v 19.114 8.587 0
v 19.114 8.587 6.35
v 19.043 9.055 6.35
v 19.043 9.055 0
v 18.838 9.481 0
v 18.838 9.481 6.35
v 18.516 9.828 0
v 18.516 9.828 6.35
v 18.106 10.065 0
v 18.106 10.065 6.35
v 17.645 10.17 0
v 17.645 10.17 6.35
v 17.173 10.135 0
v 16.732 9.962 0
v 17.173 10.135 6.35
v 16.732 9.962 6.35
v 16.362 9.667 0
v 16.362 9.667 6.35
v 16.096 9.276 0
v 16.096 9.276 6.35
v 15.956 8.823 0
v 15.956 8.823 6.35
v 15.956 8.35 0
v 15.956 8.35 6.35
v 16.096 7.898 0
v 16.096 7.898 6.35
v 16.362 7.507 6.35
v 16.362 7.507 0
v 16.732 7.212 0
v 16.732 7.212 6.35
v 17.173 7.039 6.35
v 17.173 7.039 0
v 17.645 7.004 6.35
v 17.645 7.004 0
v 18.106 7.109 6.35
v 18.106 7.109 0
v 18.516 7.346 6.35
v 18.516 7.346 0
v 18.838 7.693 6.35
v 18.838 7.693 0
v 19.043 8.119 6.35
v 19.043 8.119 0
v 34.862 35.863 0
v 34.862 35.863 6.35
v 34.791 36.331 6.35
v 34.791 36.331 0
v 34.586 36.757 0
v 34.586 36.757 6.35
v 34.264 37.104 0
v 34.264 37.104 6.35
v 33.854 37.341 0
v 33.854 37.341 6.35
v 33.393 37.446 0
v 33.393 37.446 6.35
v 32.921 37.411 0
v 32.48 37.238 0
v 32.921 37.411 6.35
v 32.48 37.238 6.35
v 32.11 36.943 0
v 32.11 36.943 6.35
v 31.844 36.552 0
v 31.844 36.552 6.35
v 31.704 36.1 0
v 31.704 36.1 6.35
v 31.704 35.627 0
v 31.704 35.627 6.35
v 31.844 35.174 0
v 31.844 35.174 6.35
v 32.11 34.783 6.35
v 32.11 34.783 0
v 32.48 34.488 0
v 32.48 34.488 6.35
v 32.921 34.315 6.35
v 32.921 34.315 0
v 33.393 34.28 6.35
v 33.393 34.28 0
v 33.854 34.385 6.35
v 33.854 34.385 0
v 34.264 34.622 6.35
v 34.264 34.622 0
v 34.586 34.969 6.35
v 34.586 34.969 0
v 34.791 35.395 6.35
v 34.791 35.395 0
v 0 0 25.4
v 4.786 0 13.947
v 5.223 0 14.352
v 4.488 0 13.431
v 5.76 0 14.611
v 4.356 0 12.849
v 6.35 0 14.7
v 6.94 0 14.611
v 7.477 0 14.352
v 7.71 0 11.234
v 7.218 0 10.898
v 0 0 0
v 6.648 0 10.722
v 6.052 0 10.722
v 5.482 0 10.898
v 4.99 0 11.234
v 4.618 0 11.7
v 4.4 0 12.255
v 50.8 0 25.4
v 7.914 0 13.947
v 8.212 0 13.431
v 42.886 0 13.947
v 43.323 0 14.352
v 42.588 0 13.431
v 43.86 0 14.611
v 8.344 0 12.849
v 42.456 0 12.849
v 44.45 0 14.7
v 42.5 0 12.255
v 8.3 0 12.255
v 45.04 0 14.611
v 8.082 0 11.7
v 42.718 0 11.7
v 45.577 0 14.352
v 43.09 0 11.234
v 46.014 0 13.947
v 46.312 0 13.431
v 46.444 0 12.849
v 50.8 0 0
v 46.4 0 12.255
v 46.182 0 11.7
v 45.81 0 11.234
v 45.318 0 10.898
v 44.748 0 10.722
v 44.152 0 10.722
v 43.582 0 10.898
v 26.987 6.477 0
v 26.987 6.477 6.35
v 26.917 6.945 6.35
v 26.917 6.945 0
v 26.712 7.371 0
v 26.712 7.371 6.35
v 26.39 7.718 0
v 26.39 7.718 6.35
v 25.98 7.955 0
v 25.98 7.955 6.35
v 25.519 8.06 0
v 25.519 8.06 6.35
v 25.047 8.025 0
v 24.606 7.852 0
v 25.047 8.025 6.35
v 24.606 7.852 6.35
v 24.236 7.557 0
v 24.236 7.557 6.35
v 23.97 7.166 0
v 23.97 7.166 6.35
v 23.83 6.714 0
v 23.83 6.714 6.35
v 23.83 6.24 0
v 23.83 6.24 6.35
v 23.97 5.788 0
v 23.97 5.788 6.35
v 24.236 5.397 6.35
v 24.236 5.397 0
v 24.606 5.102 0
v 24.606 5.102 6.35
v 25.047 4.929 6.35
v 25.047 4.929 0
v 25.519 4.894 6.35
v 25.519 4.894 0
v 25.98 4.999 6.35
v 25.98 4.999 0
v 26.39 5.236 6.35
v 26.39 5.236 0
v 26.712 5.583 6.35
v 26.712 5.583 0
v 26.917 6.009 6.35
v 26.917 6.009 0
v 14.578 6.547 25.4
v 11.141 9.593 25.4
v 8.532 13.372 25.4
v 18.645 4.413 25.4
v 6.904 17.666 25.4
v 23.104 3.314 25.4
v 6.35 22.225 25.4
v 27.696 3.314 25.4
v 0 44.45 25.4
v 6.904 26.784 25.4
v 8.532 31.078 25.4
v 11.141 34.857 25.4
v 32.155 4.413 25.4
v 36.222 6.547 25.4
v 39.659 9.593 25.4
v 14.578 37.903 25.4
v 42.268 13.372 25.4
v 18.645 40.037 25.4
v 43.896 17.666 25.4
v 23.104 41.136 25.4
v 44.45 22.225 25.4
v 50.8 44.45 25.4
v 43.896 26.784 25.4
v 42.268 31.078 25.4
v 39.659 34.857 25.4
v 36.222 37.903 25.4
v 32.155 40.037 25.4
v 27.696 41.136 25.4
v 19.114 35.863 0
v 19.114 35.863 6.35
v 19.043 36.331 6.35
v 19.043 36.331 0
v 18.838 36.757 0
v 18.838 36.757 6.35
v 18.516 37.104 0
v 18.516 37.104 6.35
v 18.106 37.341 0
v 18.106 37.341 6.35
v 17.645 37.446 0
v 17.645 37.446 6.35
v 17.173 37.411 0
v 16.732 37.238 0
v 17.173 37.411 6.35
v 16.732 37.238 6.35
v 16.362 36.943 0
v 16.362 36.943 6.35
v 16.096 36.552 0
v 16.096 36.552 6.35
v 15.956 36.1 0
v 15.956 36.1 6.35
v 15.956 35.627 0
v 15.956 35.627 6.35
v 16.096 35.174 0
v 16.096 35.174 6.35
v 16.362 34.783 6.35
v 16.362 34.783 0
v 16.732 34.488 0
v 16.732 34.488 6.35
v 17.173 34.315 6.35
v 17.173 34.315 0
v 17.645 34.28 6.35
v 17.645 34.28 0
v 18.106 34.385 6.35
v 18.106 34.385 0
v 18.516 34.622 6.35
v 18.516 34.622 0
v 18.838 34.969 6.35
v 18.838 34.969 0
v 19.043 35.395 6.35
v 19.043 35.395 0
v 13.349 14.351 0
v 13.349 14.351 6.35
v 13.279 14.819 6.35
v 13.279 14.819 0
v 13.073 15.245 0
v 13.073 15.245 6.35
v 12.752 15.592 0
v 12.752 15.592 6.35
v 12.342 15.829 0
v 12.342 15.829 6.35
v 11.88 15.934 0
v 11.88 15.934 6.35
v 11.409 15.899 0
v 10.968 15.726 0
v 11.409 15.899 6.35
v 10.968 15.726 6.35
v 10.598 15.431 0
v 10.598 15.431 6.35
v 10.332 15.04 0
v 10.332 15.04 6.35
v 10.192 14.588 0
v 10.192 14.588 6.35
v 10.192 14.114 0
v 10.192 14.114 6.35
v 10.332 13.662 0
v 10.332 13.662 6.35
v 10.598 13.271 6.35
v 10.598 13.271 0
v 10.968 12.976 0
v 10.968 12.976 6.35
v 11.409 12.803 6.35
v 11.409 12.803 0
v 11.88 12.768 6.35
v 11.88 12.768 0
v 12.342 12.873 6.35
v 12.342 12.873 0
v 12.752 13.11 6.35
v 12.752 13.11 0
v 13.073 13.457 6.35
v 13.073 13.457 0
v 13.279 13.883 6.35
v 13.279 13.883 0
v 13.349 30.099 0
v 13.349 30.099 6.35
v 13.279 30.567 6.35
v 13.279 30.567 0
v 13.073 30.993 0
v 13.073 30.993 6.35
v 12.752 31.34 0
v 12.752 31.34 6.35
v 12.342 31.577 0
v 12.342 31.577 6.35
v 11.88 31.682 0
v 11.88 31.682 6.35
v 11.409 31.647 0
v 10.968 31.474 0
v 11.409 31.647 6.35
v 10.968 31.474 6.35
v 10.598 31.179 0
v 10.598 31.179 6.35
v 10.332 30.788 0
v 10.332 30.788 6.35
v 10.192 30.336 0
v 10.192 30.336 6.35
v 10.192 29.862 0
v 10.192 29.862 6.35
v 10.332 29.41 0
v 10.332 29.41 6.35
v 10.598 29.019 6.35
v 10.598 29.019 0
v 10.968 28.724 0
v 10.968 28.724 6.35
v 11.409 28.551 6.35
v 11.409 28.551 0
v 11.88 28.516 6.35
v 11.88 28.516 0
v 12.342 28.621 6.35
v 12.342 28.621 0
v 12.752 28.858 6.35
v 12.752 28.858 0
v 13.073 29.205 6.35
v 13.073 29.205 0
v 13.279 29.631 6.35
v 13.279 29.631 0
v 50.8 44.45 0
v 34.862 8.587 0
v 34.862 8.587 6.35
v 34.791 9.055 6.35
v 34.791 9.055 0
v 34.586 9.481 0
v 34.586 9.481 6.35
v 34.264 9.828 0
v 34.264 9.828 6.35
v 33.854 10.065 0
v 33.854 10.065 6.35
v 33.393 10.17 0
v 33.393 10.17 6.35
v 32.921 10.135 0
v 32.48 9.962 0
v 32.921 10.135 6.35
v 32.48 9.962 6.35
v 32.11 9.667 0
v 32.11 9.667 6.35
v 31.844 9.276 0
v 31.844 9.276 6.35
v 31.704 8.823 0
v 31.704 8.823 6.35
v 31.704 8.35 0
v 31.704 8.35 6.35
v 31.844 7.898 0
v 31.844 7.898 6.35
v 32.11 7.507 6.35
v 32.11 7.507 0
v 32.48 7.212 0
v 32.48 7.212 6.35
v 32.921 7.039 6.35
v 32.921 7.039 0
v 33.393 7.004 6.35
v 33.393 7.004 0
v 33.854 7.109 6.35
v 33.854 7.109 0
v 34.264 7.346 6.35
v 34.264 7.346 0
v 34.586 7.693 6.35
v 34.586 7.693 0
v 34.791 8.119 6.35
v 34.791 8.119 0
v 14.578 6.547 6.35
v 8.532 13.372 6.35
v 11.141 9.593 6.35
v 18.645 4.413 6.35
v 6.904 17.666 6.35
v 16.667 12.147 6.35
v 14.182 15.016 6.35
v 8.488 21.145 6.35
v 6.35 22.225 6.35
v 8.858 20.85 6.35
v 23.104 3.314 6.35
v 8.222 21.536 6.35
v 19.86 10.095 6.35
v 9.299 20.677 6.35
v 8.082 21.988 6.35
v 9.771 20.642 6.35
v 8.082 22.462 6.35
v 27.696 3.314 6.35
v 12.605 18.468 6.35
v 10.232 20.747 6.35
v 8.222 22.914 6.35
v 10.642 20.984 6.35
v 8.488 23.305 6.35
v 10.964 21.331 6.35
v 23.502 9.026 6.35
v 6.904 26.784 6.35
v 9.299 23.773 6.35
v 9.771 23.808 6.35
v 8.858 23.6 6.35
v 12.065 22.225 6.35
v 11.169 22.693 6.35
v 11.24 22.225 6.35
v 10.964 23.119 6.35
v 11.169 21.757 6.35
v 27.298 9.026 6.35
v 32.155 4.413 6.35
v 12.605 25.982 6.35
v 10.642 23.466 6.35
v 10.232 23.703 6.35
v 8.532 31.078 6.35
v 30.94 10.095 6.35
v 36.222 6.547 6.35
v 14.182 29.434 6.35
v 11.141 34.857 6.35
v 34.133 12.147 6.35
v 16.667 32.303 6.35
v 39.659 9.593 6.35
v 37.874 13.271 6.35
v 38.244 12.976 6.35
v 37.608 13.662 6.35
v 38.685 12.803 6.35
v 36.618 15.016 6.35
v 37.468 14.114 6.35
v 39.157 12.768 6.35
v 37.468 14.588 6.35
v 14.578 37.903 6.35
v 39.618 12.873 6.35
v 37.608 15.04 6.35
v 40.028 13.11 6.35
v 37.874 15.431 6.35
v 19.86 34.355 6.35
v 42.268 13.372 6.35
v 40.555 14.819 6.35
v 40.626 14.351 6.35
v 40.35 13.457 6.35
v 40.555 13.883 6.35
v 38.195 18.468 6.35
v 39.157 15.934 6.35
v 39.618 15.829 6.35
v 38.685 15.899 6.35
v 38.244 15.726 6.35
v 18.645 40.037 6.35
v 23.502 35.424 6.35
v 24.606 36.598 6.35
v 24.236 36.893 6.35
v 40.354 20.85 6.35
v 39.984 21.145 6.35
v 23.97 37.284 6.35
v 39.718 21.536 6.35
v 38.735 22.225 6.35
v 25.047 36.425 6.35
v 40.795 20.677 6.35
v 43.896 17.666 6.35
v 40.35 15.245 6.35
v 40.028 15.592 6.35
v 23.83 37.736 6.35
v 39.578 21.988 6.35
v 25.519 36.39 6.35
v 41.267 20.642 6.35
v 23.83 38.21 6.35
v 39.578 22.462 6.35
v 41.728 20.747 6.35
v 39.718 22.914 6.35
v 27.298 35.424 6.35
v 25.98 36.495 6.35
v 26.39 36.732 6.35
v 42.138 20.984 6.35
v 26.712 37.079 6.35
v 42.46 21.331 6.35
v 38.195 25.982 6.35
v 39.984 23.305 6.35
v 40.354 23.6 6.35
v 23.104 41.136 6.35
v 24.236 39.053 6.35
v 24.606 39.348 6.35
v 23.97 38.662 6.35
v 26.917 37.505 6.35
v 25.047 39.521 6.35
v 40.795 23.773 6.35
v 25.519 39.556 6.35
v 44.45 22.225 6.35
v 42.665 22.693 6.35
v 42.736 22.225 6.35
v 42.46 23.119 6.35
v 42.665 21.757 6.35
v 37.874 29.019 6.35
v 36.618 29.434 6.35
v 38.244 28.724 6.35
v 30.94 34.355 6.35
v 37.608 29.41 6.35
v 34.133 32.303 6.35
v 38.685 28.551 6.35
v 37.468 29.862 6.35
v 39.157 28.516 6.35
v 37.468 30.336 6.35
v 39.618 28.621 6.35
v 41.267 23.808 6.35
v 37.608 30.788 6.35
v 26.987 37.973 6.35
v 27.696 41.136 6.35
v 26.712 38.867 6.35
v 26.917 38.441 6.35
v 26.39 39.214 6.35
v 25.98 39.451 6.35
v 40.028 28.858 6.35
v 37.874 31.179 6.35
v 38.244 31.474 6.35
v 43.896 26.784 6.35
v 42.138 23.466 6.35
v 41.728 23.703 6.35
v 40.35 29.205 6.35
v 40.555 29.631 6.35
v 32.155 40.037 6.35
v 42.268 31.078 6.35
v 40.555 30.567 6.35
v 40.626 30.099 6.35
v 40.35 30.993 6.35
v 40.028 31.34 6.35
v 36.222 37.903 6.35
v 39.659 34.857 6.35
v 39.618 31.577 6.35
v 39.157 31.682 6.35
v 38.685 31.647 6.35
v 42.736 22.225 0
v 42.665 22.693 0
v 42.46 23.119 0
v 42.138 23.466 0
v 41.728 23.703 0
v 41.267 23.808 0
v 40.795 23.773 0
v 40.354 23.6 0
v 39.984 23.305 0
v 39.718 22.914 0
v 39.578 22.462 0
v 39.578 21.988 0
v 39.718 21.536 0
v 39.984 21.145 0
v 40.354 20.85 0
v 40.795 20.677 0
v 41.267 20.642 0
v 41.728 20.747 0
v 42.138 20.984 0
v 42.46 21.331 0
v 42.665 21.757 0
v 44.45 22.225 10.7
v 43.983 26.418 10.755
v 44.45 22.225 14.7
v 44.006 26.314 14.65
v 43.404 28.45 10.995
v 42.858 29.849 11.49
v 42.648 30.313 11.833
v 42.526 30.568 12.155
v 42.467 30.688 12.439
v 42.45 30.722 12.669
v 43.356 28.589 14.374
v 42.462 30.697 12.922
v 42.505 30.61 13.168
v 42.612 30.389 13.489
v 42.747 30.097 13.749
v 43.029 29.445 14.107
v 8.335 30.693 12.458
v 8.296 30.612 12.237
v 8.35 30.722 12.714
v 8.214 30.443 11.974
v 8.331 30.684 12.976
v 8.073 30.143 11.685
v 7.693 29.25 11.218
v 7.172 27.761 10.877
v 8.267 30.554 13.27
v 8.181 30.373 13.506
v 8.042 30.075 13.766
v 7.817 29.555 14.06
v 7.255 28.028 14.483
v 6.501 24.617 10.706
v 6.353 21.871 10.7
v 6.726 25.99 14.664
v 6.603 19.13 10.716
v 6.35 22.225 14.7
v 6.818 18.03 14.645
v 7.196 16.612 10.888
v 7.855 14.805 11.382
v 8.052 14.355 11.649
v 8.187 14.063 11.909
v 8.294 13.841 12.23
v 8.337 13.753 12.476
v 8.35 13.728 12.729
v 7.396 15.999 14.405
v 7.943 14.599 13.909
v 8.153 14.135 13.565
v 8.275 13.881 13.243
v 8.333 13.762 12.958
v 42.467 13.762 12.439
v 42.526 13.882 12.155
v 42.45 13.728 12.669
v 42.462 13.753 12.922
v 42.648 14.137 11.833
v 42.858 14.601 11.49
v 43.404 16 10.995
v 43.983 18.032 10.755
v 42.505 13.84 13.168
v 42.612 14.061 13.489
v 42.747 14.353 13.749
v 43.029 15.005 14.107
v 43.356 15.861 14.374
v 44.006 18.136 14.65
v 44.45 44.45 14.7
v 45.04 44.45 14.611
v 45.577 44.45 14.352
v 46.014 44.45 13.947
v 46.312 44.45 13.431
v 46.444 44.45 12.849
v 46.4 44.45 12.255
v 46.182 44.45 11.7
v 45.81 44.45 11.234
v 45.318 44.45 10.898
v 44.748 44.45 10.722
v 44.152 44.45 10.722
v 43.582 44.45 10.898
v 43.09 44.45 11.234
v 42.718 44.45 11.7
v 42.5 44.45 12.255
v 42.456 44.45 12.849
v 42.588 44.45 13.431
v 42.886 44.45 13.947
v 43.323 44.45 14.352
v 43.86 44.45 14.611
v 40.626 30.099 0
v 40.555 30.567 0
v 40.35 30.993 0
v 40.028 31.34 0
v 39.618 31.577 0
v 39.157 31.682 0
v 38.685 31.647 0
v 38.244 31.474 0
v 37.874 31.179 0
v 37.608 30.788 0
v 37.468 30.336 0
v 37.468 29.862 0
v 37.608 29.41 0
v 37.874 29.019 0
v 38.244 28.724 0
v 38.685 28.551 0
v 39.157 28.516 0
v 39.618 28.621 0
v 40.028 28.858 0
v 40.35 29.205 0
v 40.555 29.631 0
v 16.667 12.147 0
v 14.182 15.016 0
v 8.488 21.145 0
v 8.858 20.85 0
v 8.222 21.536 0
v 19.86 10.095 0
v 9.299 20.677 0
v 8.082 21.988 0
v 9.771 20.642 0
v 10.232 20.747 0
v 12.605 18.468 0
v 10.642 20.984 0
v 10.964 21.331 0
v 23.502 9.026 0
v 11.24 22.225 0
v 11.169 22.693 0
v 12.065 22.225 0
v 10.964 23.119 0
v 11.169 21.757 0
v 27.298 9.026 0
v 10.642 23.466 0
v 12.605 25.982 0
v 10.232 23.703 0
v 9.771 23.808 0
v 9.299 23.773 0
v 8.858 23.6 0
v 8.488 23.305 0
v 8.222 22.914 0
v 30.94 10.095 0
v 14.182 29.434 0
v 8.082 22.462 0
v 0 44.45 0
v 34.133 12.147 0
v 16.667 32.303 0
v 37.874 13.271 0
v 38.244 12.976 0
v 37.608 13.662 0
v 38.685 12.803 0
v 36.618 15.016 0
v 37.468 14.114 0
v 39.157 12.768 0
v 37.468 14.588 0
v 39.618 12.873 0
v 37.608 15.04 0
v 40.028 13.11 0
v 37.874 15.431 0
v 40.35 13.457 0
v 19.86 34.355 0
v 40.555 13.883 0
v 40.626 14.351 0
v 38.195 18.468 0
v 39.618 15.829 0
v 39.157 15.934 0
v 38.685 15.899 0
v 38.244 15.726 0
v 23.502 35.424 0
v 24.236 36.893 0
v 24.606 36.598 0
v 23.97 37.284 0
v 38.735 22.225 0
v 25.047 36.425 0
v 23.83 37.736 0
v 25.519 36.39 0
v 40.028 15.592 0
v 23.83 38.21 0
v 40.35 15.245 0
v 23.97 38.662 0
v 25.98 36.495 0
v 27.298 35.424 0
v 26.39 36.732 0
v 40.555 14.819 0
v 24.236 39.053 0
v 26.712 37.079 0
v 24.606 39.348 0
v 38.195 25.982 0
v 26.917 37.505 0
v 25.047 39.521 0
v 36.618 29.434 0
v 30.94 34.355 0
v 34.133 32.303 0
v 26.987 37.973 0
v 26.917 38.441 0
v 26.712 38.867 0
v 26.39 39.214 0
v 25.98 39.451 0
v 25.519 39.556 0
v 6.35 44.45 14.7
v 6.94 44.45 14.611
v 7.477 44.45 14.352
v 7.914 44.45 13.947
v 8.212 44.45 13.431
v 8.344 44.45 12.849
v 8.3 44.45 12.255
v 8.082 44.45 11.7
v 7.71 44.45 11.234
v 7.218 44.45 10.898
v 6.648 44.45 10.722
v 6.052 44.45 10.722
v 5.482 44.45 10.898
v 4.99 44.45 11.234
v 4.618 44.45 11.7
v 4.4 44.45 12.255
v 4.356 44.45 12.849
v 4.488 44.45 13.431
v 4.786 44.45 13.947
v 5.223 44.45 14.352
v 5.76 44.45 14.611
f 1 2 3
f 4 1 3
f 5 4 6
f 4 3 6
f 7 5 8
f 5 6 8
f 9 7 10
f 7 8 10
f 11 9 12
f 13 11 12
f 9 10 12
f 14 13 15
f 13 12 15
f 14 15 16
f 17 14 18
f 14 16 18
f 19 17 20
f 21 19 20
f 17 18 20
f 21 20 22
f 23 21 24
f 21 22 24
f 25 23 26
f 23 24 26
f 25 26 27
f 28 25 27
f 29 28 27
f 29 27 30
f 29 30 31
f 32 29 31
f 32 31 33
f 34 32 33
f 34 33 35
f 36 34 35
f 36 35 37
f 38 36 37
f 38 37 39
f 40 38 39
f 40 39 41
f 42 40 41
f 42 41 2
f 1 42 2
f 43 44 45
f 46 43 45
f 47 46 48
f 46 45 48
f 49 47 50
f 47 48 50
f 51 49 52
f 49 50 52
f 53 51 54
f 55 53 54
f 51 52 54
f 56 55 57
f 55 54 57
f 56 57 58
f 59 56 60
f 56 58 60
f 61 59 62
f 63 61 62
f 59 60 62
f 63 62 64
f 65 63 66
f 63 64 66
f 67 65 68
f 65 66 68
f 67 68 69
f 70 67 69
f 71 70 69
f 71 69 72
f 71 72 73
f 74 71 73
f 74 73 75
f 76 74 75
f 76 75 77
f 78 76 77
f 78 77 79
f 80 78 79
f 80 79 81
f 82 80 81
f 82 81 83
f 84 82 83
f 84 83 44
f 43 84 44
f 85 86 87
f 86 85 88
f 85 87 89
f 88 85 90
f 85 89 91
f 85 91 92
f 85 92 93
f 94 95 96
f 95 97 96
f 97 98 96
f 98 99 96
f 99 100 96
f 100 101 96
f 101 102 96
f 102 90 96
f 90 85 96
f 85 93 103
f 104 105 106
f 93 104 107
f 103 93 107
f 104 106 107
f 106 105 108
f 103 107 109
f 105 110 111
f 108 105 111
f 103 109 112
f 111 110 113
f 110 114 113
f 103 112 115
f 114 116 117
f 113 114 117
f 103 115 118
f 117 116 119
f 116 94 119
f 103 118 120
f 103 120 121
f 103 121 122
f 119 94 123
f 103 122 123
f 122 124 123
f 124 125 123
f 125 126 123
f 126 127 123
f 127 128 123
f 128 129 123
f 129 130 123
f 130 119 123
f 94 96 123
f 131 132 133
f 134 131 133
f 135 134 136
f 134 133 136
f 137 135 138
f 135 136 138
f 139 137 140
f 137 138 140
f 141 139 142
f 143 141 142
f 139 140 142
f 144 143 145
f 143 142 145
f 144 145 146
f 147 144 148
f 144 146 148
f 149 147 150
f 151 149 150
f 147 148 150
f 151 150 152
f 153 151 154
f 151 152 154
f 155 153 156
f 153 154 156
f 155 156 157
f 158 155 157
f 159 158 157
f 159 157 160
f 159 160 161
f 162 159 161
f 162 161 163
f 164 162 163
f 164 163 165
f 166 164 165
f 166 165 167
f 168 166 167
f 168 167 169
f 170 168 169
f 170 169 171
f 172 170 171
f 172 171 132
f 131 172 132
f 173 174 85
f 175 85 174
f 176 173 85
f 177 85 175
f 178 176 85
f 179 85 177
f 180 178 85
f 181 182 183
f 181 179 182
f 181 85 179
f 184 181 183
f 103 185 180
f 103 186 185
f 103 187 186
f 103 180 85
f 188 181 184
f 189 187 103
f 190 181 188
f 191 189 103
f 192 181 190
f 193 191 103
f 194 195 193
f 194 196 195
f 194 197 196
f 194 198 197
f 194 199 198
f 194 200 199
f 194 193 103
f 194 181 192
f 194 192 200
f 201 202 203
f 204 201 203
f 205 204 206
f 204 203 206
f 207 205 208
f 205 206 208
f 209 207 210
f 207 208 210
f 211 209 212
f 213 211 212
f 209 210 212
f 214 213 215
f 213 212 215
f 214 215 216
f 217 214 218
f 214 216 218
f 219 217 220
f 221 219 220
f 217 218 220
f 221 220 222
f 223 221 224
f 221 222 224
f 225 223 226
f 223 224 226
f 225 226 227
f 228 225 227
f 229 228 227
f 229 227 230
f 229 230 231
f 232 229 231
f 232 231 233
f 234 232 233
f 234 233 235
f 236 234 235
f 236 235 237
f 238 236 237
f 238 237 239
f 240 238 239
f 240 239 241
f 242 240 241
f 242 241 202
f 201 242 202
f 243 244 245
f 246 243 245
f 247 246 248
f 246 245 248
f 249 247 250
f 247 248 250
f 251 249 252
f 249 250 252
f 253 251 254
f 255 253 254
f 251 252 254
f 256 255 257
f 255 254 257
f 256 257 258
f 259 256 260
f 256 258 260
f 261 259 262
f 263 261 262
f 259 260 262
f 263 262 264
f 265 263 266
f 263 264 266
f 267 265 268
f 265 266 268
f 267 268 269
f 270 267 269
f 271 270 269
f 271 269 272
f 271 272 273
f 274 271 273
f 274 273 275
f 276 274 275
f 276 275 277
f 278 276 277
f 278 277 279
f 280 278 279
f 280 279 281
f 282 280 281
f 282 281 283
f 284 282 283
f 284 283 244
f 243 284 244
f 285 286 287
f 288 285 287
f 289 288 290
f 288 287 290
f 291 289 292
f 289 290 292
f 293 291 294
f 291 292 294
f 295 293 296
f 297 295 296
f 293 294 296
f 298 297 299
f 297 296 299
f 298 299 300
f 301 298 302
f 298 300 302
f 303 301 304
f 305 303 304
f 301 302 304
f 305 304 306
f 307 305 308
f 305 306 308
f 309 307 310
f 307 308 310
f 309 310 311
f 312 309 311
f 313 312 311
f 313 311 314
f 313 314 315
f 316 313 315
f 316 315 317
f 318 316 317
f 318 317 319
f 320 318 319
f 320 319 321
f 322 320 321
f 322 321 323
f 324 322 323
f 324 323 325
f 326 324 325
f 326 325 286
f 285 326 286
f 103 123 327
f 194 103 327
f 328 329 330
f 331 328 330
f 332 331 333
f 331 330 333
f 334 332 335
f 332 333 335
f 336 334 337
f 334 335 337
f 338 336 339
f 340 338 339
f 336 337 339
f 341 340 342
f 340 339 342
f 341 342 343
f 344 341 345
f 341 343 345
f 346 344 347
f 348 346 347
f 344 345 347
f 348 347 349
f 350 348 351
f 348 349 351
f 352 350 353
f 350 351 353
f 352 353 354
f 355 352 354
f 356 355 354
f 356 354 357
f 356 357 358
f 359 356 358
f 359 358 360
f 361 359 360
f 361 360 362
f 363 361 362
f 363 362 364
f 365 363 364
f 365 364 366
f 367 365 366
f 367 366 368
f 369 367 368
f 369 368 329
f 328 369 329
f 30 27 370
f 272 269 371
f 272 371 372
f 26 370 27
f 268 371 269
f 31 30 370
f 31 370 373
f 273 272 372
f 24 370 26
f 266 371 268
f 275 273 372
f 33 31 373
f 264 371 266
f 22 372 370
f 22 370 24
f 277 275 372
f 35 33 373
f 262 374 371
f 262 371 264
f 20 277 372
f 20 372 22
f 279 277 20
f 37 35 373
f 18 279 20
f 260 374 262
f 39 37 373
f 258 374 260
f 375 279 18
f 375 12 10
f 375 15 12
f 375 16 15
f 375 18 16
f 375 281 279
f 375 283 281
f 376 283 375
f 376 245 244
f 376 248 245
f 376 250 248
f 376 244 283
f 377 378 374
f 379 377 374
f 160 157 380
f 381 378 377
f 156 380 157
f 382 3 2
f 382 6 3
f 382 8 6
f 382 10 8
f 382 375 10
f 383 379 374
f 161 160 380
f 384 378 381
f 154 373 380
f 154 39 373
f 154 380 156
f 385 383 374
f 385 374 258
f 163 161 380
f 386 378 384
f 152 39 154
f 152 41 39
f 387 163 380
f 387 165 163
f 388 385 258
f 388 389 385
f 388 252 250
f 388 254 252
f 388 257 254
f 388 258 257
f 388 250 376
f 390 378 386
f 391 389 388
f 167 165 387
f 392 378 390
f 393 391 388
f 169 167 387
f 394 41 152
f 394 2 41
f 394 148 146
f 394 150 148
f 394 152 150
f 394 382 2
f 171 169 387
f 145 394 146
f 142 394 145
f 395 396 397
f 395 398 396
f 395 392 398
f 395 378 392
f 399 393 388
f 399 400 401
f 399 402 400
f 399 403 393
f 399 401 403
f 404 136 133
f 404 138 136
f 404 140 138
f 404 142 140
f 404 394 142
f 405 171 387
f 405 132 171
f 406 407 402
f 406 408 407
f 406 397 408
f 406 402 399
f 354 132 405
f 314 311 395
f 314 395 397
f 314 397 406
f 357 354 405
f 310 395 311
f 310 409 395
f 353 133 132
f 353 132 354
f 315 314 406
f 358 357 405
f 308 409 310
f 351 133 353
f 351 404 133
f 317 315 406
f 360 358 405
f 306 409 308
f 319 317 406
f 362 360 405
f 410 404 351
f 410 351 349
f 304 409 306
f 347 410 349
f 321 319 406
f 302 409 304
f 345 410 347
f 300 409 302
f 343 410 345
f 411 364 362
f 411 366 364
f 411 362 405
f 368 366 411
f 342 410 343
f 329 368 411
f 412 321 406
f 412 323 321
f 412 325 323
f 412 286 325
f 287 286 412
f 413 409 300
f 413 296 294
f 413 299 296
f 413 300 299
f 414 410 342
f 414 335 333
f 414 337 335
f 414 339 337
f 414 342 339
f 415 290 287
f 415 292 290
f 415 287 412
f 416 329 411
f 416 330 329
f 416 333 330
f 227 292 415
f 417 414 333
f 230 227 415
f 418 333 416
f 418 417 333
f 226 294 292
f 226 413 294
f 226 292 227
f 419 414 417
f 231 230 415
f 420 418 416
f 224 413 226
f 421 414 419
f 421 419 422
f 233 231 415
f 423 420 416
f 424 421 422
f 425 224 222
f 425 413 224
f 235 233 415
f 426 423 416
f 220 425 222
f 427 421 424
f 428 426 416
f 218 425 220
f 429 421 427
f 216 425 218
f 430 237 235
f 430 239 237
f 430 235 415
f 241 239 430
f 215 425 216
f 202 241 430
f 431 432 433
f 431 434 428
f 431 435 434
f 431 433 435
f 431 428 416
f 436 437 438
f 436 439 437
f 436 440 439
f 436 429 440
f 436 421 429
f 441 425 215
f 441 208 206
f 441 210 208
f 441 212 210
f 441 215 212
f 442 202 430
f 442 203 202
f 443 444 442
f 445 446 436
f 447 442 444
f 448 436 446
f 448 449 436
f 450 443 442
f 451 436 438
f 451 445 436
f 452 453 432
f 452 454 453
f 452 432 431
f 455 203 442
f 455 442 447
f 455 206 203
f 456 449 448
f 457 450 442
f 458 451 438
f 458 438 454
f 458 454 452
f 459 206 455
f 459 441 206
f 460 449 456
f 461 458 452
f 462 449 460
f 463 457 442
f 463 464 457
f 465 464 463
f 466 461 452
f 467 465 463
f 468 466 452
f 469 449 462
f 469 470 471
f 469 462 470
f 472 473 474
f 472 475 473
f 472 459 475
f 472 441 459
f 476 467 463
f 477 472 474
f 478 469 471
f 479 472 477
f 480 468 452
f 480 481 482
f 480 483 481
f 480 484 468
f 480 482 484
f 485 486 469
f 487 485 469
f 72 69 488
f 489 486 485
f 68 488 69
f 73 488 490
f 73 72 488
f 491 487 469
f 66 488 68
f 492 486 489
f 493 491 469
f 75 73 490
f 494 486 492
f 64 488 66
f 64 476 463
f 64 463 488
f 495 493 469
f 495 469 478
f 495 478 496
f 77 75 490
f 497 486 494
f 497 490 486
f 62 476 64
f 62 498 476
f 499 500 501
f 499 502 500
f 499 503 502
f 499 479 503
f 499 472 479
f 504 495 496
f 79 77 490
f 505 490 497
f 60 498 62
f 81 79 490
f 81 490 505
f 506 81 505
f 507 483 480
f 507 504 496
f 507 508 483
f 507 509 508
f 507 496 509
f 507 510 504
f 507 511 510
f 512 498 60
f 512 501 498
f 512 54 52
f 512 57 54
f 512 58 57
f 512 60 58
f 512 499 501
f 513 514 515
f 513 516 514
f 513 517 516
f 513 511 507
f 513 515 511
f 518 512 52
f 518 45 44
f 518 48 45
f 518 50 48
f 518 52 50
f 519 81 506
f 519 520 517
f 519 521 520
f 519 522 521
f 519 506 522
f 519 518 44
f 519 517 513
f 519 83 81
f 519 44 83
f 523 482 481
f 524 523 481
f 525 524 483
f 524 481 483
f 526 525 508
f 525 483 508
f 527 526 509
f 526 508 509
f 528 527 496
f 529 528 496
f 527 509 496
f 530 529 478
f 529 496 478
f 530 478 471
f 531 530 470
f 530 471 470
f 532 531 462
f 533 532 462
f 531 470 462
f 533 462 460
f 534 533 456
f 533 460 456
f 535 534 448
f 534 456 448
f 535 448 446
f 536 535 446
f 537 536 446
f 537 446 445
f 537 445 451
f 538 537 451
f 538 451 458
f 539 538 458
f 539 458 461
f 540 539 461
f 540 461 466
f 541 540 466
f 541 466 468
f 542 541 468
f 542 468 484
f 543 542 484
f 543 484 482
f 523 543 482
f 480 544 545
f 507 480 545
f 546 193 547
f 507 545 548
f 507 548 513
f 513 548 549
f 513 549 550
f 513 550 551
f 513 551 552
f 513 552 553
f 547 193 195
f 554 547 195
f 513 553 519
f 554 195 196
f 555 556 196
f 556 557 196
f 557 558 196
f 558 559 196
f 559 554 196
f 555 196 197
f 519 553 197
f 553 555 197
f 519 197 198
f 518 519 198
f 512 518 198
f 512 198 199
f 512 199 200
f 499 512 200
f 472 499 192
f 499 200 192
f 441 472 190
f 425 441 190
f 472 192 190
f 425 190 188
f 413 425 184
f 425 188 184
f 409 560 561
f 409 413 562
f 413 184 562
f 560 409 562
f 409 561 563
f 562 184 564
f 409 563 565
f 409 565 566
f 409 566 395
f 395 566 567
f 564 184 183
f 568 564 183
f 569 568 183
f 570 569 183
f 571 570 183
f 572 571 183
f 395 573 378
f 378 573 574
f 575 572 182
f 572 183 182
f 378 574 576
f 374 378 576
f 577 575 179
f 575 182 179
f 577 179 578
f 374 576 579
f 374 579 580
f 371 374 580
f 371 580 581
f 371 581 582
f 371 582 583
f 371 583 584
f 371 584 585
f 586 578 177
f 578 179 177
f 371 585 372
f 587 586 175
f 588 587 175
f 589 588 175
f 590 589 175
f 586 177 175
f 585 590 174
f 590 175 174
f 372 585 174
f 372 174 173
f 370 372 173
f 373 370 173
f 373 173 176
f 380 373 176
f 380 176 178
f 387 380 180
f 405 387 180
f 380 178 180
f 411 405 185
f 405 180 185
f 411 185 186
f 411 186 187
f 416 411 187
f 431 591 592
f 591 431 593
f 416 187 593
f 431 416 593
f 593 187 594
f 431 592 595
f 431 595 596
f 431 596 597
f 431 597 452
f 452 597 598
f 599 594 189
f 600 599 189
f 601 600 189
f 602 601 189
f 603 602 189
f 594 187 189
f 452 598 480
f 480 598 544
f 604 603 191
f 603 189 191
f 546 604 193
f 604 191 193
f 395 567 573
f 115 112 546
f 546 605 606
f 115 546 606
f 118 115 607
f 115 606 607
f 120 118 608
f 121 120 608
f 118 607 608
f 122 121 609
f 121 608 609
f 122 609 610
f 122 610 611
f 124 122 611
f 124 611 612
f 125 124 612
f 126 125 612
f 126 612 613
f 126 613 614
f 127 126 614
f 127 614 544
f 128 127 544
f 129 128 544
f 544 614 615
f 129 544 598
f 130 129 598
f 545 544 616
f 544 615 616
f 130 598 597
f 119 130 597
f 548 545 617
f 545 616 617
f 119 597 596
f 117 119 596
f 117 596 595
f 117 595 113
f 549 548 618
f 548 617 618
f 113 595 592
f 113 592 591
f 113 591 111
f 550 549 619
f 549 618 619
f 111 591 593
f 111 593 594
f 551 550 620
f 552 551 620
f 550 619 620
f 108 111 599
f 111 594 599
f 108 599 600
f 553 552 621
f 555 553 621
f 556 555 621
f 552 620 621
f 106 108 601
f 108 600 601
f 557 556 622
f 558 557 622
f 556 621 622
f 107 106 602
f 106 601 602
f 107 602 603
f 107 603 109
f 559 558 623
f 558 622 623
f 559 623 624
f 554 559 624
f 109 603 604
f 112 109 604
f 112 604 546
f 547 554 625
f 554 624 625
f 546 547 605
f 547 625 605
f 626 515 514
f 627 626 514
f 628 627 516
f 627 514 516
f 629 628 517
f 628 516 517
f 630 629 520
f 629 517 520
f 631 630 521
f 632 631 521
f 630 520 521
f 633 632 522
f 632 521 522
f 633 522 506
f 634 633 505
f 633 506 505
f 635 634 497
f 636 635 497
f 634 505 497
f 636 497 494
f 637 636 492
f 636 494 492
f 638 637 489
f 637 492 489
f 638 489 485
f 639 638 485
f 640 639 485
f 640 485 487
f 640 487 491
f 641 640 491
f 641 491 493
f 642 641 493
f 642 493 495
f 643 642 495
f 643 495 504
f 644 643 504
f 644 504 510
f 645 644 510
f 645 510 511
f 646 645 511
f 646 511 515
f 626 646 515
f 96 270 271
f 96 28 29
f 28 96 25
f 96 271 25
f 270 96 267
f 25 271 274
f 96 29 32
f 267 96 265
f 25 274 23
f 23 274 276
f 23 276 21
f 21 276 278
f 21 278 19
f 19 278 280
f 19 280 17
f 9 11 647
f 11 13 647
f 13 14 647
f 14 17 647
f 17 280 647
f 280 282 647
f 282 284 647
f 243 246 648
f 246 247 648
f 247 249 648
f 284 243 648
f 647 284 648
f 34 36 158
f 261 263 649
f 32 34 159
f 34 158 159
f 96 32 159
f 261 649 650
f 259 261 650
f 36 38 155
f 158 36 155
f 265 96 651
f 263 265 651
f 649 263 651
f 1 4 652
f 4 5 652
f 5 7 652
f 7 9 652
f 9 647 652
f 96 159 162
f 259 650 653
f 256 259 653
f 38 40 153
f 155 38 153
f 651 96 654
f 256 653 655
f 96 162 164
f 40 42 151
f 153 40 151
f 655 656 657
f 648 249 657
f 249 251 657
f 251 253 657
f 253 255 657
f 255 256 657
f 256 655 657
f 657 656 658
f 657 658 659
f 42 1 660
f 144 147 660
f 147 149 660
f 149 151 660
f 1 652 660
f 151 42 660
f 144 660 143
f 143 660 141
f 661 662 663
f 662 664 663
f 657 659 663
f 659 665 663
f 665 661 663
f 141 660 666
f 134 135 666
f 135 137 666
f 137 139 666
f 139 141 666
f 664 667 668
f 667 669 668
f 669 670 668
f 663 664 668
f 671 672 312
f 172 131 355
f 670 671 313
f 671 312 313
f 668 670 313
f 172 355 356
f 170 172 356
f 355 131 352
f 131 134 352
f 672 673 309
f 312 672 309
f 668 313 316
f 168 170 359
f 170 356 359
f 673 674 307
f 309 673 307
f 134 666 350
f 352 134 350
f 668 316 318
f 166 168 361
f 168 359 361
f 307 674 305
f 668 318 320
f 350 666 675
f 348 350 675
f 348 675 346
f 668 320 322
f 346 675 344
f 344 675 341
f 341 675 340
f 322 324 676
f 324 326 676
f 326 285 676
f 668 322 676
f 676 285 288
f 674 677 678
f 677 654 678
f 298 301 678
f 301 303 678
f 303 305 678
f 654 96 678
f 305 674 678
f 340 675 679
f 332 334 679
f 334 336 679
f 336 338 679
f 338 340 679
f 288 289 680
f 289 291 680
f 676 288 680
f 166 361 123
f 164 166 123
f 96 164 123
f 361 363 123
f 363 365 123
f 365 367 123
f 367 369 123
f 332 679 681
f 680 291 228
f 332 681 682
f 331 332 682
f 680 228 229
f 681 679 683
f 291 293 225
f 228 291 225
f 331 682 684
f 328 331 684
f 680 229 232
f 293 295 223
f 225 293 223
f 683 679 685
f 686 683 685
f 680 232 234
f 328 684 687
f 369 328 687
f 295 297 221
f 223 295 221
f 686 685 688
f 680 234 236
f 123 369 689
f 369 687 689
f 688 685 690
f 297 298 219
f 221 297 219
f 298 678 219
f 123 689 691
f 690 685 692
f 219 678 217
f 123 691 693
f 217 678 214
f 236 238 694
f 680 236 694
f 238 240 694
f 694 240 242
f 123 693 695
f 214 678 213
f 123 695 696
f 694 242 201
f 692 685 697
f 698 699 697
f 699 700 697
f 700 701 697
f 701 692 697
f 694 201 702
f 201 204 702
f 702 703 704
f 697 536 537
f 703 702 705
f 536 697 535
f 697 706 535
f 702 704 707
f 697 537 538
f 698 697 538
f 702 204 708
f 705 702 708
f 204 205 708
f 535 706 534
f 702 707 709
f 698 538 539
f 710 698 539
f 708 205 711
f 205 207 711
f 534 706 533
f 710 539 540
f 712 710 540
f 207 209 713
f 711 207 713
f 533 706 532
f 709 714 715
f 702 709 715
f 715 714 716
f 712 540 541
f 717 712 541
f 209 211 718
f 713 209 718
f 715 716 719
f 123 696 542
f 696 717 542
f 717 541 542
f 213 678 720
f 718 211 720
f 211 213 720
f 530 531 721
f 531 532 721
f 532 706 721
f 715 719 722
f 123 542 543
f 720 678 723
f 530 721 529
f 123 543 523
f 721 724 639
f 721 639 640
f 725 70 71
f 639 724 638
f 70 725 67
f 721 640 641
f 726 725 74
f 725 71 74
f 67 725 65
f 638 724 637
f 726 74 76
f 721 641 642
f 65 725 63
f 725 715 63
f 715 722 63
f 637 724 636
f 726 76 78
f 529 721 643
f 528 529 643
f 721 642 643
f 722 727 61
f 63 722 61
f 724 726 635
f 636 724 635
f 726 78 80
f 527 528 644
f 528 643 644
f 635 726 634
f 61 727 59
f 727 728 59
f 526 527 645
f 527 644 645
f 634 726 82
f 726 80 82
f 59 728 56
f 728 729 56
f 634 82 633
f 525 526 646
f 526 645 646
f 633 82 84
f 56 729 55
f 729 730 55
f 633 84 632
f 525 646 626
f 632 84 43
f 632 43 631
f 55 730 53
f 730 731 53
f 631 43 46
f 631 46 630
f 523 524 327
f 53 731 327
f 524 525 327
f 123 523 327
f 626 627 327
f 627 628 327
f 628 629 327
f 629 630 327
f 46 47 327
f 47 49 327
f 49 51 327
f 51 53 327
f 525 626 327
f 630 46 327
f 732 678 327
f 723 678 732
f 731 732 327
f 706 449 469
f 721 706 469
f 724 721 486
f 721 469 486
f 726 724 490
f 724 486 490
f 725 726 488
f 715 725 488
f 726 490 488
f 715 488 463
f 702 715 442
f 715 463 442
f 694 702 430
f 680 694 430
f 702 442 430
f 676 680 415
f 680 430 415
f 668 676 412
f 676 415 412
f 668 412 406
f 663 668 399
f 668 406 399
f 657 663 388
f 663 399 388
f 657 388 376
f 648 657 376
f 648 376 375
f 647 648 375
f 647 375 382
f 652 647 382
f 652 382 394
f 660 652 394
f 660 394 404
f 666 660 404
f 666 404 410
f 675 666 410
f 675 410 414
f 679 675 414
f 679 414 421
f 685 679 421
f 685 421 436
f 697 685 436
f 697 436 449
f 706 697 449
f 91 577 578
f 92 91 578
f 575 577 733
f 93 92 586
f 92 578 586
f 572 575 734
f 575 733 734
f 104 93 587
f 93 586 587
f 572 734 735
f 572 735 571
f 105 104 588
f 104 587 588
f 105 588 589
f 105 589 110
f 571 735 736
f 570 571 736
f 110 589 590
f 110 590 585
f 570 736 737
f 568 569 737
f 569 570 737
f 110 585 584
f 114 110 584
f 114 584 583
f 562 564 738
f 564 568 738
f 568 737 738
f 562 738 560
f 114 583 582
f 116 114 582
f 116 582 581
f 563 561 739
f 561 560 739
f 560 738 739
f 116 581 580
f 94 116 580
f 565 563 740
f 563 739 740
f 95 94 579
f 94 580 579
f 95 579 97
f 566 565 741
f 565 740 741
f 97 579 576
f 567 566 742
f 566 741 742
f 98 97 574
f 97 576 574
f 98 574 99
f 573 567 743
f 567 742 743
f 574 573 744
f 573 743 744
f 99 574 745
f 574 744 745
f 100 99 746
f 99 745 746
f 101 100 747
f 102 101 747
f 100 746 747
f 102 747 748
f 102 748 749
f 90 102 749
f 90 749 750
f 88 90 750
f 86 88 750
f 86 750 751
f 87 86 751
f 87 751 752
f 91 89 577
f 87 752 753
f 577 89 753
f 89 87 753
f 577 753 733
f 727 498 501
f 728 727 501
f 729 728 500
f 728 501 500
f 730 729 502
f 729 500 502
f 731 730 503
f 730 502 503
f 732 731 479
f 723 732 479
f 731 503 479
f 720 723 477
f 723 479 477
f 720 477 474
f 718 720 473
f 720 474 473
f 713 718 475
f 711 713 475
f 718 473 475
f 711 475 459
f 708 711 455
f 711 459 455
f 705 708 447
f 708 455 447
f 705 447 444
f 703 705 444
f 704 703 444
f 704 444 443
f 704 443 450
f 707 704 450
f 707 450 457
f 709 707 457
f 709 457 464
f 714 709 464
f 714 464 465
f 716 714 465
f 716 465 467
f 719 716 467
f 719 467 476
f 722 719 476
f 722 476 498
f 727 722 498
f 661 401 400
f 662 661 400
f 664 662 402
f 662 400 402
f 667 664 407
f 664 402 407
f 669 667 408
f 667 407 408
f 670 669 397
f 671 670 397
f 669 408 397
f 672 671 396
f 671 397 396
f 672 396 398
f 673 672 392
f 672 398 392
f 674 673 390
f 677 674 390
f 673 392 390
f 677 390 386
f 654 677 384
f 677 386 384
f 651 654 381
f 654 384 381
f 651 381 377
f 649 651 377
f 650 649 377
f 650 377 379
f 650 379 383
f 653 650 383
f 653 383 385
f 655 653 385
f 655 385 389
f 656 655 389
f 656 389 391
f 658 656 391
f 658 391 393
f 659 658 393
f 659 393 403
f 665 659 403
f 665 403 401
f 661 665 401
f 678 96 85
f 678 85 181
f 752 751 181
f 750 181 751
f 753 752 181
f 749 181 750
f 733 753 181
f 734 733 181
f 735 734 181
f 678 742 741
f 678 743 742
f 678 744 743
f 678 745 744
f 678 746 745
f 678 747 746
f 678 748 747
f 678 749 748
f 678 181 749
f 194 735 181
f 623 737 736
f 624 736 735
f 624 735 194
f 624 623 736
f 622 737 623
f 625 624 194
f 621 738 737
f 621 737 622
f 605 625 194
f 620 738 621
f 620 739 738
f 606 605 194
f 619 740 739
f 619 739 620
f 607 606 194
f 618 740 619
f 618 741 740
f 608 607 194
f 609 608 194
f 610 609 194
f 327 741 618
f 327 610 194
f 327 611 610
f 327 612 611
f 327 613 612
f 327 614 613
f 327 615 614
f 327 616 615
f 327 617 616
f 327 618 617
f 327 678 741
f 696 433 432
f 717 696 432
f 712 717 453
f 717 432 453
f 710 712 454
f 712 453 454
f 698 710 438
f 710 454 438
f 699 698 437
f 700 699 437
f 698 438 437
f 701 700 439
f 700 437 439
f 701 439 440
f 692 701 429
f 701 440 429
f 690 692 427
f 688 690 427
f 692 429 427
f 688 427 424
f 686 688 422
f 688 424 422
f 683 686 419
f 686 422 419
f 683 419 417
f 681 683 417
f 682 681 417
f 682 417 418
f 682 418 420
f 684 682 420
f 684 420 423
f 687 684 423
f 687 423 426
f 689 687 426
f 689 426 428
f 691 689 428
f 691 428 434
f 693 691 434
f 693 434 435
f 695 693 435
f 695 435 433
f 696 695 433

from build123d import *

# Parameters (mm, degrees)
SKETCH1_W           = 50.8
SKETCH1_H           = 44.45
BOSS_EXTRUDE1_DEPTH = 25.4
SKETCH2_R           = 19.05
CUT_EXTRUDE1_DEPTH  = 19.05
SKETCH3_R           = 13.335
SKETCH3_R_2         = 1.5875
CUT_EXTRUDE2_DEPTH  = 71.138042459
SKETCH4_R           = 2
CUT_EXTRUDE3_DEPTH  = 73.122135992


with BuildPart() as part:
    # Sketch1 → Boss-Extrude1 (new body)
    with BuildSketch(Plane.XY):
        with Locations((25.4, 22.225)):
            Rectangle(SKETCH1_W, SKETCH1_H)
    extrude(amount=BOSS_EXTRUDE1_DEPTH)

    # Sketch2 → Cut-Extrude1 (cut)
    with BuildSketch(Plane.XY.offset(25.4)):
        with Locations((25.4, 22.225)):
            Circle(SKETCH2_R)
    extrude(amount=-CUT_EXTRUDE1_DEPTH, mode=Mode.SUBTRACT)

    # Sketch3 → Cut-Extrude2 (cut, through all)
    with BuildSketch(Plane.XY.offset(6.35)):
        with Locations((25.4, 22.225)):
            Circle(SKETCH3_R)
        with Locations((9.652, 22.225)):
            Circle(SKETCH3_R_2)
        with Locations((11.761831941, 30.099)):
            Circle(SKETCH3_R_2)
        with Locations((17.526, 35.863168059)):
            Circle(SKETCH3_R_2)
        with Locations((25.4, 37.973)):
            Circle(SKETCH3_R_2)
        with Locations((33.274, 35.863168059)):
            Circle(SKETCH3_R_2)
        with Locations((39.038168059, 30.099)):
            Circle(SKETCH3_R_2)
        with Locations((41.148, 22.225)):
            Circle(SKETCH3_R_2)
        with Locations((39.038168059, 14.351)):
            Circle(SKETCH3_R_2)
        with Locations((33.274, 8.586831941)):
            Circle(SKETCH3_R_2)
        with Locations((25.4, 6.477)):
            Circle(SKETCH3_R_2)
        with Locations((17.526, 8.586831941)):
            Circle(SKETCH3_R_2)
        with Locations((11.761831941, 14.351)):
            Circle(SKETCH3_R_2)
    extrude(amount=-CUT_EXTRUDE2_DEPTH, mode=Mode.SUBTRACT)

    # Sketch4 → Cut-Extrude3 (cut, through all)
    with BuildSketch(Plane(origin=(0, 44.45, 0), x_dir=(1, 0, 0), z_dir=(0, 1, 0))):
        with Locations(Location((6.35, -12.7, 0), (0, 0, 270))):
            Circle(SKETCH4_R)
        with Locations(Location((44.45, -12.7, 0), (0, 0, 270))):
            Circle(SKETCH4_R)
    extrude(amount=-CUT_EXTRUDE3_DEPTH, mode=Mode.SUBTRACT)


solid = part.part
